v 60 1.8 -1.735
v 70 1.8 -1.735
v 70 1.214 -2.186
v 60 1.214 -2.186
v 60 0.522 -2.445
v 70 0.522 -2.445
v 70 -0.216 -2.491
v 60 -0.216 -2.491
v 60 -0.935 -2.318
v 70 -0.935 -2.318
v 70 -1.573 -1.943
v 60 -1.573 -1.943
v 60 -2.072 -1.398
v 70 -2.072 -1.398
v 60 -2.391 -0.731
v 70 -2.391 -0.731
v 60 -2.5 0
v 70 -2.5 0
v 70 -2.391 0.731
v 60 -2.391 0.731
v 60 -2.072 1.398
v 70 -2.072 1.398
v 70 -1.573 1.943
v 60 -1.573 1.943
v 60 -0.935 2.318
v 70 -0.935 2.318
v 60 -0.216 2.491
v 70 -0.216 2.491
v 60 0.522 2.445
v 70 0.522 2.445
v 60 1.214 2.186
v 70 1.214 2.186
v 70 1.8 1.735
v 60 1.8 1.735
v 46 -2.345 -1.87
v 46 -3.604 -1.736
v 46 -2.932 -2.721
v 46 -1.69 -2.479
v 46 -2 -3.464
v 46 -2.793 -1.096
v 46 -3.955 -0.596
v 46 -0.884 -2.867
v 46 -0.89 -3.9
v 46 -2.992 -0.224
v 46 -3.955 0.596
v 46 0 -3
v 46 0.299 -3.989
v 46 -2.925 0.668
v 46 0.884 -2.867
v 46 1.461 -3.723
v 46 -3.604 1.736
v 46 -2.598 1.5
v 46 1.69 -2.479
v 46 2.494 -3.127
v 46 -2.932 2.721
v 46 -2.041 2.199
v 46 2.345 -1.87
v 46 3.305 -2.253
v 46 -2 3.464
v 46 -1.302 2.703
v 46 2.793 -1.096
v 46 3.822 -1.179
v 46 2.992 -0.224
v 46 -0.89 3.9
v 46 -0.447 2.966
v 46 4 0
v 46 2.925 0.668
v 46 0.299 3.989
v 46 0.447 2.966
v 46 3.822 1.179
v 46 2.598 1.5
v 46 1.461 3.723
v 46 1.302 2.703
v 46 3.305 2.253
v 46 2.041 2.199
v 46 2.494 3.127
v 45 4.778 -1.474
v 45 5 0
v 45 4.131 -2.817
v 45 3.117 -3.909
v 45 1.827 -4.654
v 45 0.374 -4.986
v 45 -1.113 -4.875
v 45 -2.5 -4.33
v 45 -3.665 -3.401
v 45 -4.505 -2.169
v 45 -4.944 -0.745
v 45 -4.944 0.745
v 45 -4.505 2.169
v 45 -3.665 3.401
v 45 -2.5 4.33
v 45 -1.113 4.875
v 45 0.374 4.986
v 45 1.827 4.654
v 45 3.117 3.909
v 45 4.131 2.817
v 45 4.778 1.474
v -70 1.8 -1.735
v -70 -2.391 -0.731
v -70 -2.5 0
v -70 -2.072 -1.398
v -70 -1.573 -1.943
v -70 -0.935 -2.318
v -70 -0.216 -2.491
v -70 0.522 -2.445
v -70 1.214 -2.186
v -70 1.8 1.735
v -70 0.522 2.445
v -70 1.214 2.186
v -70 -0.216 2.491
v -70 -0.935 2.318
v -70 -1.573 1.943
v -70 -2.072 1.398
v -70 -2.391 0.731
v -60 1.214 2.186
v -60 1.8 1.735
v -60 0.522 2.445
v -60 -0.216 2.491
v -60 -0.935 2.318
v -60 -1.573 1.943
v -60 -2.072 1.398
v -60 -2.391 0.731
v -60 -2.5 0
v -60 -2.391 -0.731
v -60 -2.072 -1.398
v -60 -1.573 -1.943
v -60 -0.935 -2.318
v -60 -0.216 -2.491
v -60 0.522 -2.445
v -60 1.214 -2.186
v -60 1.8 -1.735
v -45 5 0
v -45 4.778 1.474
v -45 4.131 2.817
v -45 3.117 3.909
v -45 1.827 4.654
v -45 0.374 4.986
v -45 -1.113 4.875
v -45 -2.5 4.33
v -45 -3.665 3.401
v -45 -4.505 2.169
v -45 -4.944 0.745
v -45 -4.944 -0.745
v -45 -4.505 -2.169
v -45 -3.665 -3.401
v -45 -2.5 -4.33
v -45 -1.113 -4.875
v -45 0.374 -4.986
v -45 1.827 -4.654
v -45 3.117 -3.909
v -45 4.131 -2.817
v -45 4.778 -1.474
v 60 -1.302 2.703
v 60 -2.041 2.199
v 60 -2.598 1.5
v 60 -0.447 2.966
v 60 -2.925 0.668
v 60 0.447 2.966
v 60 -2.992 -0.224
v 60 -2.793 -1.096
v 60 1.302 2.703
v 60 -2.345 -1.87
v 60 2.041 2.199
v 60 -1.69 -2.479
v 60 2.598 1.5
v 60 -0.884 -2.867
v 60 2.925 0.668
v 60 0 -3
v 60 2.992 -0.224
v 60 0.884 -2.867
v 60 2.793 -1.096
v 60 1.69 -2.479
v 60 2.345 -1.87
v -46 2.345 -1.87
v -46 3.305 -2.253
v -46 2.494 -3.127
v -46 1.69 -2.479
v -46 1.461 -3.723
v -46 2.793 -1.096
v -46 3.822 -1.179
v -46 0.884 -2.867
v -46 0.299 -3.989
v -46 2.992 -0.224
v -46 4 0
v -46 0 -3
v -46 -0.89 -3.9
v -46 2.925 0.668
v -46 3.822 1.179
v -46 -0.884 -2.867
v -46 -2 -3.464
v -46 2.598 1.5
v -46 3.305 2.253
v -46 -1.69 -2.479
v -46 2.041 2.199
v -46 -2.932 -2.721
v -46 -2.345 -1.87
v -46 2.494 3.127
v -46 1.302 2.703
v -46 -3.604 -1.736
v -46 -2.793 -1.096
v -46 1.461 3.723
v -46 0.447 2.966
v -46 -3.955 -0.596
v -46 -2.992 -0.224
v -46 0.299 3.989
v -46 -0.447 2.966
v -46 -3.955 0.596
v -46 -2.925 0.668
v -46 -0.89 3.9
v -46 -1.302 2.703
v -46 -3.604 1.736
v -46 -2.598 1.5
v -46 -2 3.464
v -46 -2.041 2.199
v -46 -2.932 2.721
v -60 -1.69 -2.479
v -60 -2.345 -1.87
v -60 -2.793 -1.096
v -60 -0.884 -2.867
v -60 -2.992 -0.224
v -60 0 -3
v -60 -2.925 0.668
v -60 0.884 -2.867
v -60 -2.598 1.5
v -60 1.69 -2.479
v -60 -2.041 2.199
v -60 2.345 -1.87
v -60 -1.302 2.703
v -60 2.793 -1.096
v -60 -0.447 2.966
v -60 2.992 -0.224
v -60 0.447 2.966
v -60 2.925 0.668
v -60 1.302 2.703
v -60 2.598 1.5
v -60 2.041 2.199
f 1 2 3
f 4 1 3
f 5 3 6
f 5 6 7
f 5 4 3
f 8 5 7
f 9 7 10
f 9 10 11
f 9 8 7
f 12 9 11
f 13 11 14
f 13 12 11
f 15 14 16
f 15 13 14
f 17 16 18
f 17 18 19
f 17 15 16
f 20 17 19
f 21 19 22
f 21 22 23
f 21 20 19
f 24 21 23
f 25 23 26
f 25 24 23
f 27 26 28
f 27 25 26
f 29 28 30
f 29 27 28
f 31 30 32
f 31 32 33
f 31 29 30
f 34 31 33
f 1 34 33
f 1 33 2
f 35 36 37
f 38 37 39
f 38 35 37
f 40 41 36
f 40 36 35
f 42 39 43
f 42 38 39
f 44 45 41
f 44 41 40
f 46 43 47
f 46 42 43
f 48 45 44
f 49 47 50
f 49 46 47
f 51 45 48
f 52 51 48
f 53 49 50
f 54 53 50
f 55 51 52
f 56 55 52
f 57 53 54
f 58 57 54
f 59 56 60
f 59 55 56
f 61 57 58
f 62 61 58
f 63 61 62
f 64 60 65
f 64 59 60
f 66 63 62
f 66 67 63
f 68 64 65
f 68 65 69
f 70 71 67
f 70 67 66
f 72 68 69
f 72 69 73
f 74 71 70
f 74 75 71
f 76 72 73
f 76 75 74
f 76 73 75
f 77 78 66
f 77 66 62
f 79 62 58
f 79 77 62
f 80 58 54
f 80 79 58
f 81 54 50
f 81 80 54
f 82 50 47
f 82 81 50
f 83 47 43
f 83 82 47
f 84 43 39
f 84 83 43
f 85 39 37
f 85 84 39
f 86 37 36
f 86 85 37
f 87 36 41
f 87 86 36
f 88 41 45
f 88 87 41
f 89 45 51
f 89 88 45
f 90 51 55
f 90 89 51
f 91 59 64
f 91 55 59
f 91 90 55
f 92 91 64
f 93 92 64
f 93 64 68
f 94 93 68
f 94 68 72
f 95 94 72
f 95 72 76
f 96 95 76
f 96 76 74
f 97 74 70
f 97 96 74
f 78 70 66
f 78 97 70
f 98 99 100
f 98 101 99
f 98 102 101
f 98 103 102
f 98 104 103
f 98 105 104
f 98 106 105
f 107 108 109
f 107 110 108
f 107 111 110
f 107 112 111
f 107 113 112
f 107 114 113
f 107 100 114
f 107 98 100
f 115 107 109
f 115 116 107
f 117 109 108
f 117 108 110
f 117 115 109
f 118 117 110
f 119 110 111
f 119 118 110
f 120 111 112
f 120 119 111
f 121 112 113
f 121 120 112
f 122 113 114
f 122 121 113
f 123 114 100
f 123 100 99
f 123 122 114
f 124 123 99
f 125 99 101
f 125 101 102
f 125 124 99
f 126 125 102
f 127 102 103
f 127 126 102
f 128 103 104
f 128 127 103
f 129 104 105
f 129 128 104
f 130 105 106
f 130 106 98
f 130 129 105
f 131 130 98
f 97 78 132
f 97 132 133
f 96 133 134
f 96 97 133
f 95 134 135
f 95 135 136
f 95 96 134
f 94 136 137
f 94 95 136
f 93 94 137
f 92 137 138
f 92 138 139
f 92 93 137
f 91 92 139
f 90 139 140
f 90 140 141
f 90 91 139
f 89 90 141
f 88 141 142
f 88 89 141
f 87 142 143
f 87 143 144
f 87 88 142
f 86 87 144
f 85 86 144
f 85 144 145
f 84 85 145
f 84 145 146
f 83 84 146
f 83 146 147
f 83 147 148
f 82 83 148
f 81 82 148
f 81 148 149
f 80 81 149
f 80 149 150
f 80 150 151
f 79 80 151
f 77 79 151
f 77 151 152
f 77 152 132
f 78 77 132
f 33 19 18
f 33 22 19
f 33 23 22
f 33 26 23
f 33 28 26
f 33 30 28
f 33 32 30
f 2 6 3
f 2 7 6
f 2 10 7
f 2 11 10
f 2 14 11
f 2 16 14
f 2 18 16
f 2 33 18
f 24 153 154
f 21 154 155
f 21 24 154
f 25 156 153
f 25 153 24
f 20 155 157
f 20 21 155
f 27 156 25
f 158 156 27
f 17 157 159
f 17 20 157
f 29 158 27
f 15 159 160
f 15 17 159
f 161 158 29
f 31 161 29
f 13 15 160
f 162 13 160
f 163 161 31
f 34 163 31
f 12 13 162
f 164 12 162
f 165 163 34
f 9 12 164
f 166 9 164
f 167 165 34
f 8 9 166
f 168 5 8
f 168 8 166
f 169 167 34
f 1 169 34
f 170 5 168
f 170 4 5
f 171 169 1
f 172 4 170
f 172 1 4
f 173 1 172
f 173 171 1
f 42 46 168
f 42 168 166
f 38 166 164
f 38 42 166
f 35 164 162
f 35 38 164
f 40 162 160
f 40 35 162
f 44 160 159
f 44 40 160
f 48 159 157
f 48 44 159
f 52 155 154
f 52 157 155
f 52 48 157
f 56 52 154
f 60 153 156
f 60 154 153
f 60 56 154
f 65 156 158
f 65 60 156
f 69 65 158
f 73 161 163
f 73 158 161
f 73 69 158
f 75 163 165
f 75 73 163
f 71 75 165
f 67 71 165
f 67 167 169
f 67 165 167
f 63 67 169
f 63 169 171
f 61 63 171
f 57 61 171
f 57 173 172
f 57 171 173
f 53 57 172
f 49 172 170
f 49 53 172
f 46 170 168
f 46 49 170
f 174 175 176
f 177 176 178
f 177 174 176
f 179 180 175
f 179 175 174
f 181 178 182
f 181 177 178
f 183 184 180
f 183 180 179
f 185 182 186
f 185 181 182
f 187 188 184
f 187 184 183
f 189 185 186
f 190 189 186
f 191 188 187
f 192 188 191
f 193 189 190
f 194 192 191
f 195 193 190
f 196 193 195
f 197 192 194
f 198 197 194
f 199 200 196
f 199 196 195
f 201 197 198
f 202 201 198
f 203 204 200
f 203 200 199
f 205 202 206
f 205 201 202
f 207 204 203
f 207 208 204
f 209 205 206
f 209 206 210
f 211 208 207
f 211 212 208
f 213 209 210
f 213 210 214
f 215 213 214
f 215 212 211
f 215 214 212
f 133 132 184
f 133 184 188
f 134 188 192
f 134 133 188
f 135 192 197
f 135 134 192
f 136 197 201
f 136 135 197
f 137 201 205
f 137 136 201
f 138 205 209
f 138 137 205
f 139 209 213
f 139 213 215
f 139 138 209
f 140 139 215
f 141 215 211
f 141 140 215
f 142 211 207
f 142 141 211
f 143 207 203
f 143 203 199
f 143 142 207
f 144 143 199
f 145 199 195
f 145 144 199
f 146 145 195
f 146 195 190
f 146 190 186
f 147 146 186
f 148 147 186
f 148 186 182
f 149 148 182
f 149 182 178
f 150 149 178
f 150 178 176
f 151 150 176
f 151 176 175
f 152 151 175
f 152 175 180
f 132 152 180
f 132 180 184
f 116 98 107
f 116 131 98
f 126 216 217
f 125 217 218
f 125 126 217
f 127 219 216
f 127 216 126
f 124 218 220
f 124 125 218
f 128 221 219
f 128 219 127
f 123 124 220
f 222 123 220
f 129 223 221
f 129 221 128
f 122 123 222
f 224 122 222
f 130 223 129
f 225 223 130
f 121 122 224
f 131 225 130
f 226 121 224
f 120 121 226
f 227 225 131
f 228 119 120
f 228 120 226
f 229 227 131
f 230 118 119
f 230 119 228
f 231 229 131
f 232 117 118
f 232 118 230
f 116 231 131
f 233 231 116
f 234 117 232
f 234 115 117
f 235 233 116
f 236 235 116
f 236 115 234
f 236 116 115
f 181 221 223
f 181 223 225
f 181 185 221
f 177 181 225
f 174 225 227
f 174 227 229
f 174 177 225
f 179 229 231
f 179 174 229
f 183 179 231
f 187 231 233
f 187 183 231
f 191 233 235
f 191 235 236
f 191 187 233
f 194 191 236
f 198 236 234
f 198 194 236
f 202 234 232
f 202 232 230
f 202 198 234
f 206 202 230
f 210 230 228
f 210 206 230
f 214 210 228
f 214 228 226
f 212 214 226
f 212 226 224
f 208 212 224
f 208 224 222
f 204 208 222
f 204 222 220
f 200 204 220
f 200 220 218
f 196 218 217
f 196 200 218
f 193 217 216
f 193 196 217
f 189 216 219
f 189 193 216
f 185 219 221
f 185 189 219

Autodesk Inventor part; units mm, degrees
ref_plane "YZ Plane" through (0, 0, 0) normal (1, 0, 0) x (0, 1, 0)
ref_plane "XZ Plane" through (0, 0, 0) normal (0, 1, 0) x (-1, 0, 0)
ref_plane "XY Plane" through (0, 0, 0) normal (0, 0, 1) x (1, 0, 0)
sketch "Sketch1" plane through (0, 0, 0) normal (1, 0, 0) x (0, 1, 0)
  circle A0 centre (0, 0) radius 5
  dimension "d0" = 10
extrude "Extrusion1" add sketch "Sketch1" along normal blind 46
thread "Thread1" size "M10x1.5" class "6g" standard "ANSI Metric M Profile" full length
chamfer "Chamfer1" distance 1 angle 45 1 edges at (46, -5, 0)
sketch "Sketch2" plane through (46, 0, 0) normal (1, 0, 0) x (0, 0, -1)
  circle A0 centre (0, 0) radius 3
  dimension "d8" = 6
extrude "Extrusion2" add sketch "Sketch2" along normal blind 14
sketch "Sketch3" plane through (60, 0, 0) normal (1, 0, 0) x (0, 0, -1)
  circle A0 centre (0, 0) radius 2.5
  line L0 (-1.7349, 1.8) -> (1.7349, 1.8)
  dimension "d11" = 5
  dimension "d12" = 1.8
extrude "Extrusion3" add sketch "Sketch3" along normal blind 10 contours A0 L0 picked at (0.076, 0.3701)
mirror "Mirror1" about plane through (0, 0, 0) normal (-1, 0, 0) of "Extrusion1", "Chamfer1", "Extrusion2", "Extrusion3"
properties part number "КВ33.000.104 - Вал" material "Iron, Ductile"
